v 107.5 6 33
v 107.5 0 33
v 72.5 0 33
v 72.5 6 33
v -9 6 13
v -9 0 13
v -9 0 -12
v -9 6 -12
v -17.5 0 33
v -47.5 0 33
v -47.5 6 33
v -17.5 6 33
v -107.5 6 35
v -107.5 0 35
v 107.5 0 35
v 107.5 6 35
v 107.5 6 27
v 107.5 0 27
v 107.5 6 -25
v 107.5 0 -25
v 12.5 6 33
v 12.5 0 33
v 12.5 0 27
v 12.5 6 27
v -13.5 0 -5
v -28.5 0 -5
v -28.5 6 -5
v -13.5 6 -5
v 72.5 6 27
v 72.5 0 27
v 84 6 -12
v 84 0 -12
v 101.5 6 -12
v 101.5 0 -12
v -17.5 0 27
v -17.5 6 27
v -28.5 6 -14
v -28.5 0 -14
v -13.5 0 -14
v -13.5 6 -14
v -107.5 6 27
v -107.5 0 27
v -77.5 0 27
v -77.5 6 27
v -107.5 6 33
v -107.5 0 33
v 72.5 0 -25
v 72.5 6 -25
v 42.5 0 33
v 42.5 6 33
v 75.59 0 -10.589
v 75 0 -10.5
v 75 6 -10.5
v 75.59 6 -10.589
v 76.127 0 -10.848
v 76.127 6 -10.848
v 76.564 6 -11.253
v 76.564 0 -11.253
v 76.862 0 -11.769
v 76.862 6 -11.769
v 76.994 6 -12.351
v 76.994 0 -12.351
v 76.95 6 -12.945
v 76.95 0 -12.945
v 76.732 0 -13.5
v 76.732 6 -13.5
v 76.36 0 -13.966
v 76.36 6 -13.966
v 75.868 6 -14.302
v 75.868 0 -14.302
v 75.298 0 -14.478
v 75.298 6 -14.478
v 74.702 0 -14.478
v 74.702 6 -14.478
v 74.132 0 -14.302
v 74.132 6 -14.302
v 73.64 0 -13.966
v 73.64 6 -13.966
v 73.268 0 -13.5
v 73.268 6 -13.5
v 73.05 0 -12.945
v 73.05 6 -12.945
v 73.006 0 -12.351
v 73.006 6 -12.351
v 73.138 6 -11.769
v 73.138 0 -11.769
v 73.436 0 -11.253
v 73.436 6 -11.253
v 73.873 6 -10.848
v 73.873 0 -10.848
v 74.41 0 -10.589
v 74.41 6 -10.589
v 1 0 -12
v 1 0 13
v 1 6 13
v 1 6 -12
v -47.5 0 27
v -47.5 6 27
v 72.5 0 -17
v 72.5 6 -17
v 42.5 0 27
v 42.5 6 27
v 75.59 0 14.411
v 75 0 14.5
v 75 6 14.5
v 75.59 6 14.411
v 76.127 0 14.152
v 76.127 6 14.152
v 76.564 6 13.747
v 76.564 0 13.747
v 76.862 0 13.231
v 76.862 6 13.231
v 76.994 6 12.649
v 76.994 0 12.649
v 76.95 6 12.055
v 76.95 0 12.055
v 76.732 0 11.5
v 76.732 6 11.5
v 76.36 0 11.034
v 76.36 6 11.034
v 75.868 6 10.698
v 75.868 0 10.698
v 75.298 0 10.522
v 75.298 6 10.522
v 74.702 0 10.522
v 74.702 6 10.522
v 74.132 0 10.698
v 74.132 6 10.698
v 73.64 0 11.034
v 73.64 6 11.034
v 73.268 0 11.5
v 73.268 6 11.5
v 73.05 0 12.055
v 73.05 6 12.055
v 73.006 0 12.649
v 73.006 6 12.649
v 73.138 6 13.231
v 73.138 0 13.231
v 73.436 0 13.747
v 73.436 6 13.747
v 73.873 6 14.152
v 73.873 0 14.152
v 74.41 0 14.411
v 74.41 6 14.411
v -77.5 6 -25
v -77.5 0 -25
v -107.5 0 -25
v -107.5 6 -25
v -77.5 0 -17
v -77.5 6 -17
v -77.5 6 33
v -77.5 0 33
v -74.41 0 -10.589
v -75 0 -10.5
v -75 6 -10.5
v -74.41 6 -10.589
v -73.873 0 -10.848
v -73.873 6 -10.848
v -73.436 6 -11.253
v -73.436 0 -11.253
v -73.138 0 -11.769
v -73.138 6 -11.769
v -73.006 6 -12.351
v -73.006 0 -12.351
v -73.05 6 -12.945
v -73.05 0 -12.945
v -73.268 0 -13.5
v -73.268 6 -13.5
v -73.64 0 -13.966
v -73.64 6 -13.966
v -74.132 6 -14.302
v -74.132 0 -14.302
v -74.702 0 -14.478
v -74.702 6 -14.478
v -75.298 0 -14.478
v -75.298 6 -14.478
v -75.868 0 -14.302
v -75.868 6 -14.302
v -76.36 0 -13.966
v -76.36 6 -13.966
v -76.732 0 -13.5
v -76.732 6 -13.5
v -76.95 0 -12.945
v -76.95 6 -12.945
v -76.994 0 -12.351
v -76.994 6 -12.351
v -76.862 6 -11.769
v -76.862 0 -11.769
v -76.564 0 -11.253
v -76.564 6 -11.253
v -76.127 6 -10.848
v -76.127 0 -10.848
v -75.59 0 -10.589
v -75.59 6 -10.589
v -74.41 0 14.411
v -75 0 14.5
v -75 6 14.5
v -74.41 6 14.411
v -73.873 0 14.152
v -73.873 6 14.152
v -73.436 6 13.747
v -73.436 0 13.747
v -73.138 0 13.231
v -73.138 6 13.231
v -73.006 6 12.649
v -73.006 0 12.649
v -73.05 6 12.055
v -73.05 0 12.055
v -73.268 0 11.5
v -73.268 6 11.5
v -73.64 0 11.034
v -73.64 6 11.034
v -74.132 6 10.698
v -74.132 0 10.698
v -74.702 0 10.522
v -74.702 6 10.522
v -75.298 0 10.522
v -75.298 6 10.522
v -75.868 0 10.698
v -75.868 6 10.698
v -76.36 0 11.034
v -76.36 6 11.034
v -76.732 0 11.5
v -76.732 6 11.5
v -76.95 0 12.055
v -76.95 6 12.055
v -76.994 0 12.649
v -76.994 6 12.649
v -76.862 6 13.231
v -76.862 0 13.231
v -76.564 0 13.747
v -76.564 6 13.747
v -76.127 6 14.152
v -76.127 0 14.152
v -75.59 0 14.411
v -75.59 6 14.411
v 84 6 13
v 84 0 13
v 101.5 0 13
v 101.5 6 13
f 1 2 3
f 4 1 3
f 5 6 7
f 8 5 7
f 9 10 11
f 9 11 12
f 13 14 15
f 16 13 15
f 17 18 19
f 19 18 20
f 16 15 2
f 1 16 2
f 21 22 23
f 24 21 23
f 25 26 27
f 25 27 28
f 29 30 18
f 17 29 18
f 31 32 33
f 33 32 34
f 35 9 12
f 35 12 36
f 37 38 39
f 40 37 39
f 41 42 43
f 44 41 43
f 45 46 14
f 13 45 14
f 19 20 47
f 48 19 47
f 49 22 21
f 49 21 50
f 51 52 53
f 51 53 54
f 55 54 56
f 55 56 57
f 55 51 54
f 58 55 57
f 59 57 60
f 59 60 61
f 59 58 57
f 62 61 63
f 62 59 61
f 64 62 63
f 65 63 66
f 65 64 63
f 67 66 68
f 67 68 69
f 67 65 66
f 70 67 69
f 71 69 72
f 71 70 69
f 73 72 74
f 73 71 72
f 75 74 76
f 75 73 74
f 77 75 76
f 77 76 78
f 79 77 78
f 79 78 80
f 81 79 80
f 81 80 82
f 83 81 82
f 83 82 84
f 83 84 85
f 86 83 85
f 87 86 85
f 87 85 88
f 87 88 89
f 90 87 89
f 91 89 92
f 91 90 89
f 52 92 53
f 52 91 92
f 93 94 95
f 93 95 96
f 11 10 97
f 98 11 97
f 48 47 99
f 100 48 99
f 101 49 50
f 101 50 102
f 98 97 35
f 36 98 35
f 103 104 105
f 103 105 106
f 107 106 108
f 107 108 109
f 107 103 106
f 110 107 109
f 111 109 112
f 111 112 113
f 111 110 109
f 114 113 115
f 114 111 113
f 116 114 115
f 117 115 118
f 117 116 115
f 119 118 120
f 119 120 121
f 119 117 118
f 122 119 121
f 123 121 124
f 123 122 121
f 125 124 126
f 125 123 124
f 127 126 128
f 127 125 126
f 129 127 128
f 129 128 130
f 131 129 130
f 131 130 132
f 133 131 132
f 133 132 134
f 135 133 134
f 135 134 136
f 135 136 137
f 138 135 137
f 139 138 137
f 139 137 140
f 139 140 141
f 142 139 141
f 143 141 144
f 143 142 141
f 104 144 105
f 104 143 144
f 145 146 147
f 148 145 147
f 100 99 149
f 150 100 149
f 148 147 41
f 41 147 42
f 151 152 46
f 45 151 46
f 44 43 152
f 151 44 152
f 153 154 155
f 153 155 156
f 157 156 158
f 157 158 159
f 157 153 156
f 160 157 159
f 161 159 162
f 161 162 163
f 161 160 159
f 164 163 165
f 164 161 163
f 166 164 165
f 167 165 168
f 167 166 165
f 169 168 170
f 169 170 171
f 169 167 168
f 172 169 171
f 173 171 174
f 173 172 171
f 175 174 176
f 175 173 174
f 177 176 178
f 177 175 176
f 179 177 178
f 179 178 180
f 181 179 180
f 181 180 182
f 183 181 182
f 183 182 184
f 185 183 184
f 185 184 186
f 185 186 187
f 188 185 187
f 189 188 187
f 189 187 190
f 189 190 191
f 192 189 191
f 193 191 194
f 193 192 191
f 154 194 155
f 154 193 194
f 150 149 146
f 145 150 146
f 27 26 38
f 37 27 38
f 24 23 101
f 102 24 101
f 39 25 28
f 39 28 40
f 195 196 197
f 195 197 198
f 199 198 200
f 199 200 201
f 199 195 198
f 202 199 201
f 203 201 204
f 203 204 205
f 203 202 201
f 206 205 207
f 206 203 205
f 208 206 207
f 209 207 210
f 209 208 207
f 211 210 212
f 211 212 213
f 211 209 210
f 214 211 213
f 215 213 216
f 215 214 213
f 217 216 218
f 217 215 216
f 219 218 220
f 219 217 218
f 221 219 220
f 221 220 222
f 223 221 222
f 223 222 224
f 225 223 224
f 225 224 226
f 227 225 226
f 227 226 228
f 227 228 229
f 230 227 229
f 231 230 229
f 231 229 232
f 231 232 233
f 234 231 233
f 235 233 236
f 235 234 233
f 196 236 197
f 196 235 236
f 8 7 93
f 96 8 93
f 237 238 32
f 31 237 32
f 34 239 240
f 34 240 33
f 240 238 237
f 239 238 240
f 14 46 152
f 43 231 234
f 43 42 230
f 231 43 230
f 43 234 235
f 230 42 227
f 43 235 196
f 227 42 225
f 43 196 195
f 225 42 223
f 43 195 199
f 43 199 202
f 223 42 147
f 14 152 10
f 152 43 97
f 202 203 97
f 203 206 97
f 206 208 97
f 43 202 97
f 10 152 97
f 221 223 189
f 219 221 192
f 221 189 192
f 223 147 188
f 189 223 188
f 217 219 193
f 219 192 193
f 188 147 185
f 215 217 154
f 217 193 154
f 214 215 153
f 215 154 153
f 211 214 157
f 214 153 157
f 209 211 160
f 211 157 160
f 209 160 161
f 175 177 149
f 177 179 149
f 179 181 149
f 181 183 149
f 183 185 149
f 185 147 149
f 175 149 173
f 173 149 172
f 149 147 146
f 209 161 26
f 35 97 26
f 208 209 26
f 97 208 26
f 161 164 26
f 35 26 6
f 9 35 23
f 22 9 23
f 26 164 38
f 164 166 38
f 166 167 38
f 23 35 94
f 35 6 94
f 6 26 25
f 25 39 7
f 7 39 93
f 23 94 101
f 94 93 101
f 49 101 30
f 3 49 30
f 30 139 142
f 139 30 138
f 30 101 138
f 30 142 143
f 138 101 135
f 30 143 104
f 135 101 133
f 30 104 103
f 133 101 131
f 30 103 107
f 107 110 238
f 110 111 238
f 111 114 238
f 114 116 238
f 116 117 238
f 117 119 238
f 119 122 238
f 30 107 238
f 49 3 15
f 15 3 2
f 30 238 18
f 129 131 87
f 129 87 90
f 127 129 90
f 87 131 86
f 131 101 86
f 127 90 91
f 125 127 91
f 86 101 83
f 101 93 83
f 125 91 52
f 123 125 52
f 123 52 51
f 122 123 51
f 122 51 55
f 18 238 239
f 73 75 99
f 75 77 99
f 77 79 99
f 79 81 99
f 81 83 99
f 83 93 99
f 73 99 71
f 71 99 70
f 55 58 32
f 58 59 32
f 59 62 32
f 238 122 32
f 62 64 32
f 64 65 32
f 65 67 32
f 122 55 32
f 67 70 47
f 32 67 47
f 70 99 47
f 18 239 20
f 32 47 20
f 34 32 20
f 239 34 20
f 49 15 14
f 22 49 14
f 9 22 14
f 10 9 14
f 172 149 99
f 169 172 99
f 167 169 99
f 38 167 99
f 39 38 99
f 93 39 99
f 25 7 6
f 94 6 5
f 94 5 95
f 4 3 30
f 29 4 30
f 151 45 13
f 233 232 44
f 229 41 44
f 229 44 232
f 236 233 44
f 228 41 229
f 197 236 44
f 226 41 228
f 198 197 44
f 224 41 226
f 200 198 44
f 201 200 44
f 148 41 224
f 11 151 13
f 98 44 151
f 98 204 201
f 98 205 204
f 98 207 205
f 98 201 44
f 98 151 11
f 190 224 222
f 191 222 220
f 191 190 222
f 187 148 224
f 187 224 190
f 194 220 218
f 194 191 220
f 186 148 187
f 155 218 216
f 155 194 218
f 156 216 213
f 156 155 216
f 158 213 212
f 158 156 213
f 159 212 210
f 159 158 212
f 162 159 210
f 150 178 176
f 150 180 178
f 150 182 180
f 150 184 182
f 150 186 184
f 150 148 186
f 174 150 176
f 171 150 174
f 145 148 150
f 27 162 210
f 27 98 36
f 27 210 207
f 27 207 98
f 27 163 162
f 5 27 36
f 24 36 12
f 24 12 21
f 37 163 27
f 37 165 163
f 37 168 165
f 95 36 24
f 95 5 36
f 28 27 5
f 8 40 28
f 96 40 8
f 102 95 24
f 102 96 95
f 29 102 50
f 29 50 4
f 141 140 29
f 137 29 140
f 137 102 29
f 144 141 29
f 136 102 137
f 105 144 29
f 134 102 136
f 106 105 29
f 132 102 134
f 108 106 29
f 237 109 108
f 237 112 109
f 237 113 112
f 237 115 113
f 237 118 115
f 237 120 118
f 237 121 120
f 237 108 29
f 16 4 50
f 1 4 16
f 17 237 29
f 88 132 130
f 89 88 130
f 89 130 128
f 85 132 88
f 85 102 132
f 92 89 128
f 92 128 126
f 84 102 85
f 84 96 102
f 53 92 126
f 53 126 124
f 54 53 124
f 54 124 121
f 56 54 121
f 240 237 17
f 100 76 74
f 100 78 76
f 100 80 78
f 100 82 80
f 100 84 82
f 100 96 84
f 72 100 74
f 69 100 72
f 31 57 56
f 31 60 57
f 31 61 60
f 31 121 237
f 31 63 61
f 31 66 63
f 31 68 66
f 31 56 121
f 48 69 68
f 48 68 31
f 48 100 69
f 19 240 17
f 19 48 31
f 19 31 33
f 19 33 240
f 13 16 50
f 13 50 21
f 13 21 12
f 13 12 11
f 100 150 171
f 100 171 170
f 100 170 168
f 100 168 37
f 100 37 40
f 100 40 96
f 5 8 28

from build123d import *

# Parameters (mm, degrees)
SKETCH_1_W      = 30
SKETCH_1_H      = 6
SKETCH_1_R      = 2
SKETCH_1_W_2    = 10
SKETCH_1_H_2    = 25
SKETCH_1_W_3    = 15
SKETCH_1_H_3    = 9
SKETCH_1_W_4    = 17.5
EXTRUDE_1_DEPTH = 6


with BuildPart() as part:
    # Эскиз1 → Бобышка-Вытянуть1 (new body)
    with BuildSketch(Plane(origin=(0, 0, 0), x_dir=(1, 0, 0), z_dir=(0, 1, 0))):
        Polygon((-77.5, 25), (-107.5, 25), (-107.5, -27), (-77.5, -27), (-77.5, -33), (-107.5, -33), (-107.5, -35), (107.5, -35), (107.5, -33), (72.5, -33), (72.5, -27), (107.5, -27), (107.5, 25), (72.5, 25), (72.5, 17), (-77.5, 17), align=None)
        with Locations((-32.5, -30)):
            Rectangle(SKETCH_1_W, SKETCH_1_H, mode=Mode.SUBTRACT)
        with Locations(Location((-75, -12.5, 0), (0, 0, 270))):
            Circle(SKETCH_1_R, mode=Mode.SUBTRACT)
        with Locations((27.5, -30)):
            Rectangle(SKETCH_1_W, SKETCH_1_H, mode=Mode.SUBTRACT)
        with Locations(Location((75, -12.5, 0), (0, 0, 270))):
            Circle(SKETCH_1_R, mode=Mode.SUBTRACT)
        with Locations((-4, -0.5)):
            Rectangle(SKETCH_1_W_2, SKETCH_1_H_2, mode=Mode.SUBTRACT)
        with Locations((-21, 9.5)):
            Rectangle(SKETCH_1_W_3, SKETCH_1_H_3, mode=Mode.SUBTRACT)
        with Locations(Location((-75, 12.5, 0), (0, 0, 270))):
            Circle(SKETCH_1_R, mode=Mode.SUBTRACT)
        with Locations((92.75, -0.5)):
            Rectangle(SKETCH_1_W_4, SKETCH_1_H_2, mode=Mode.SUBTRACT)
        with Locations(Location((75, 12.5, 0), (0, 0, 270))):
            Circle(SKETCH_1_R, mode=Mode.SUBTRACT)
    extrude(amount=EXTRUDE_1_DEPTH)


solid = part.part
